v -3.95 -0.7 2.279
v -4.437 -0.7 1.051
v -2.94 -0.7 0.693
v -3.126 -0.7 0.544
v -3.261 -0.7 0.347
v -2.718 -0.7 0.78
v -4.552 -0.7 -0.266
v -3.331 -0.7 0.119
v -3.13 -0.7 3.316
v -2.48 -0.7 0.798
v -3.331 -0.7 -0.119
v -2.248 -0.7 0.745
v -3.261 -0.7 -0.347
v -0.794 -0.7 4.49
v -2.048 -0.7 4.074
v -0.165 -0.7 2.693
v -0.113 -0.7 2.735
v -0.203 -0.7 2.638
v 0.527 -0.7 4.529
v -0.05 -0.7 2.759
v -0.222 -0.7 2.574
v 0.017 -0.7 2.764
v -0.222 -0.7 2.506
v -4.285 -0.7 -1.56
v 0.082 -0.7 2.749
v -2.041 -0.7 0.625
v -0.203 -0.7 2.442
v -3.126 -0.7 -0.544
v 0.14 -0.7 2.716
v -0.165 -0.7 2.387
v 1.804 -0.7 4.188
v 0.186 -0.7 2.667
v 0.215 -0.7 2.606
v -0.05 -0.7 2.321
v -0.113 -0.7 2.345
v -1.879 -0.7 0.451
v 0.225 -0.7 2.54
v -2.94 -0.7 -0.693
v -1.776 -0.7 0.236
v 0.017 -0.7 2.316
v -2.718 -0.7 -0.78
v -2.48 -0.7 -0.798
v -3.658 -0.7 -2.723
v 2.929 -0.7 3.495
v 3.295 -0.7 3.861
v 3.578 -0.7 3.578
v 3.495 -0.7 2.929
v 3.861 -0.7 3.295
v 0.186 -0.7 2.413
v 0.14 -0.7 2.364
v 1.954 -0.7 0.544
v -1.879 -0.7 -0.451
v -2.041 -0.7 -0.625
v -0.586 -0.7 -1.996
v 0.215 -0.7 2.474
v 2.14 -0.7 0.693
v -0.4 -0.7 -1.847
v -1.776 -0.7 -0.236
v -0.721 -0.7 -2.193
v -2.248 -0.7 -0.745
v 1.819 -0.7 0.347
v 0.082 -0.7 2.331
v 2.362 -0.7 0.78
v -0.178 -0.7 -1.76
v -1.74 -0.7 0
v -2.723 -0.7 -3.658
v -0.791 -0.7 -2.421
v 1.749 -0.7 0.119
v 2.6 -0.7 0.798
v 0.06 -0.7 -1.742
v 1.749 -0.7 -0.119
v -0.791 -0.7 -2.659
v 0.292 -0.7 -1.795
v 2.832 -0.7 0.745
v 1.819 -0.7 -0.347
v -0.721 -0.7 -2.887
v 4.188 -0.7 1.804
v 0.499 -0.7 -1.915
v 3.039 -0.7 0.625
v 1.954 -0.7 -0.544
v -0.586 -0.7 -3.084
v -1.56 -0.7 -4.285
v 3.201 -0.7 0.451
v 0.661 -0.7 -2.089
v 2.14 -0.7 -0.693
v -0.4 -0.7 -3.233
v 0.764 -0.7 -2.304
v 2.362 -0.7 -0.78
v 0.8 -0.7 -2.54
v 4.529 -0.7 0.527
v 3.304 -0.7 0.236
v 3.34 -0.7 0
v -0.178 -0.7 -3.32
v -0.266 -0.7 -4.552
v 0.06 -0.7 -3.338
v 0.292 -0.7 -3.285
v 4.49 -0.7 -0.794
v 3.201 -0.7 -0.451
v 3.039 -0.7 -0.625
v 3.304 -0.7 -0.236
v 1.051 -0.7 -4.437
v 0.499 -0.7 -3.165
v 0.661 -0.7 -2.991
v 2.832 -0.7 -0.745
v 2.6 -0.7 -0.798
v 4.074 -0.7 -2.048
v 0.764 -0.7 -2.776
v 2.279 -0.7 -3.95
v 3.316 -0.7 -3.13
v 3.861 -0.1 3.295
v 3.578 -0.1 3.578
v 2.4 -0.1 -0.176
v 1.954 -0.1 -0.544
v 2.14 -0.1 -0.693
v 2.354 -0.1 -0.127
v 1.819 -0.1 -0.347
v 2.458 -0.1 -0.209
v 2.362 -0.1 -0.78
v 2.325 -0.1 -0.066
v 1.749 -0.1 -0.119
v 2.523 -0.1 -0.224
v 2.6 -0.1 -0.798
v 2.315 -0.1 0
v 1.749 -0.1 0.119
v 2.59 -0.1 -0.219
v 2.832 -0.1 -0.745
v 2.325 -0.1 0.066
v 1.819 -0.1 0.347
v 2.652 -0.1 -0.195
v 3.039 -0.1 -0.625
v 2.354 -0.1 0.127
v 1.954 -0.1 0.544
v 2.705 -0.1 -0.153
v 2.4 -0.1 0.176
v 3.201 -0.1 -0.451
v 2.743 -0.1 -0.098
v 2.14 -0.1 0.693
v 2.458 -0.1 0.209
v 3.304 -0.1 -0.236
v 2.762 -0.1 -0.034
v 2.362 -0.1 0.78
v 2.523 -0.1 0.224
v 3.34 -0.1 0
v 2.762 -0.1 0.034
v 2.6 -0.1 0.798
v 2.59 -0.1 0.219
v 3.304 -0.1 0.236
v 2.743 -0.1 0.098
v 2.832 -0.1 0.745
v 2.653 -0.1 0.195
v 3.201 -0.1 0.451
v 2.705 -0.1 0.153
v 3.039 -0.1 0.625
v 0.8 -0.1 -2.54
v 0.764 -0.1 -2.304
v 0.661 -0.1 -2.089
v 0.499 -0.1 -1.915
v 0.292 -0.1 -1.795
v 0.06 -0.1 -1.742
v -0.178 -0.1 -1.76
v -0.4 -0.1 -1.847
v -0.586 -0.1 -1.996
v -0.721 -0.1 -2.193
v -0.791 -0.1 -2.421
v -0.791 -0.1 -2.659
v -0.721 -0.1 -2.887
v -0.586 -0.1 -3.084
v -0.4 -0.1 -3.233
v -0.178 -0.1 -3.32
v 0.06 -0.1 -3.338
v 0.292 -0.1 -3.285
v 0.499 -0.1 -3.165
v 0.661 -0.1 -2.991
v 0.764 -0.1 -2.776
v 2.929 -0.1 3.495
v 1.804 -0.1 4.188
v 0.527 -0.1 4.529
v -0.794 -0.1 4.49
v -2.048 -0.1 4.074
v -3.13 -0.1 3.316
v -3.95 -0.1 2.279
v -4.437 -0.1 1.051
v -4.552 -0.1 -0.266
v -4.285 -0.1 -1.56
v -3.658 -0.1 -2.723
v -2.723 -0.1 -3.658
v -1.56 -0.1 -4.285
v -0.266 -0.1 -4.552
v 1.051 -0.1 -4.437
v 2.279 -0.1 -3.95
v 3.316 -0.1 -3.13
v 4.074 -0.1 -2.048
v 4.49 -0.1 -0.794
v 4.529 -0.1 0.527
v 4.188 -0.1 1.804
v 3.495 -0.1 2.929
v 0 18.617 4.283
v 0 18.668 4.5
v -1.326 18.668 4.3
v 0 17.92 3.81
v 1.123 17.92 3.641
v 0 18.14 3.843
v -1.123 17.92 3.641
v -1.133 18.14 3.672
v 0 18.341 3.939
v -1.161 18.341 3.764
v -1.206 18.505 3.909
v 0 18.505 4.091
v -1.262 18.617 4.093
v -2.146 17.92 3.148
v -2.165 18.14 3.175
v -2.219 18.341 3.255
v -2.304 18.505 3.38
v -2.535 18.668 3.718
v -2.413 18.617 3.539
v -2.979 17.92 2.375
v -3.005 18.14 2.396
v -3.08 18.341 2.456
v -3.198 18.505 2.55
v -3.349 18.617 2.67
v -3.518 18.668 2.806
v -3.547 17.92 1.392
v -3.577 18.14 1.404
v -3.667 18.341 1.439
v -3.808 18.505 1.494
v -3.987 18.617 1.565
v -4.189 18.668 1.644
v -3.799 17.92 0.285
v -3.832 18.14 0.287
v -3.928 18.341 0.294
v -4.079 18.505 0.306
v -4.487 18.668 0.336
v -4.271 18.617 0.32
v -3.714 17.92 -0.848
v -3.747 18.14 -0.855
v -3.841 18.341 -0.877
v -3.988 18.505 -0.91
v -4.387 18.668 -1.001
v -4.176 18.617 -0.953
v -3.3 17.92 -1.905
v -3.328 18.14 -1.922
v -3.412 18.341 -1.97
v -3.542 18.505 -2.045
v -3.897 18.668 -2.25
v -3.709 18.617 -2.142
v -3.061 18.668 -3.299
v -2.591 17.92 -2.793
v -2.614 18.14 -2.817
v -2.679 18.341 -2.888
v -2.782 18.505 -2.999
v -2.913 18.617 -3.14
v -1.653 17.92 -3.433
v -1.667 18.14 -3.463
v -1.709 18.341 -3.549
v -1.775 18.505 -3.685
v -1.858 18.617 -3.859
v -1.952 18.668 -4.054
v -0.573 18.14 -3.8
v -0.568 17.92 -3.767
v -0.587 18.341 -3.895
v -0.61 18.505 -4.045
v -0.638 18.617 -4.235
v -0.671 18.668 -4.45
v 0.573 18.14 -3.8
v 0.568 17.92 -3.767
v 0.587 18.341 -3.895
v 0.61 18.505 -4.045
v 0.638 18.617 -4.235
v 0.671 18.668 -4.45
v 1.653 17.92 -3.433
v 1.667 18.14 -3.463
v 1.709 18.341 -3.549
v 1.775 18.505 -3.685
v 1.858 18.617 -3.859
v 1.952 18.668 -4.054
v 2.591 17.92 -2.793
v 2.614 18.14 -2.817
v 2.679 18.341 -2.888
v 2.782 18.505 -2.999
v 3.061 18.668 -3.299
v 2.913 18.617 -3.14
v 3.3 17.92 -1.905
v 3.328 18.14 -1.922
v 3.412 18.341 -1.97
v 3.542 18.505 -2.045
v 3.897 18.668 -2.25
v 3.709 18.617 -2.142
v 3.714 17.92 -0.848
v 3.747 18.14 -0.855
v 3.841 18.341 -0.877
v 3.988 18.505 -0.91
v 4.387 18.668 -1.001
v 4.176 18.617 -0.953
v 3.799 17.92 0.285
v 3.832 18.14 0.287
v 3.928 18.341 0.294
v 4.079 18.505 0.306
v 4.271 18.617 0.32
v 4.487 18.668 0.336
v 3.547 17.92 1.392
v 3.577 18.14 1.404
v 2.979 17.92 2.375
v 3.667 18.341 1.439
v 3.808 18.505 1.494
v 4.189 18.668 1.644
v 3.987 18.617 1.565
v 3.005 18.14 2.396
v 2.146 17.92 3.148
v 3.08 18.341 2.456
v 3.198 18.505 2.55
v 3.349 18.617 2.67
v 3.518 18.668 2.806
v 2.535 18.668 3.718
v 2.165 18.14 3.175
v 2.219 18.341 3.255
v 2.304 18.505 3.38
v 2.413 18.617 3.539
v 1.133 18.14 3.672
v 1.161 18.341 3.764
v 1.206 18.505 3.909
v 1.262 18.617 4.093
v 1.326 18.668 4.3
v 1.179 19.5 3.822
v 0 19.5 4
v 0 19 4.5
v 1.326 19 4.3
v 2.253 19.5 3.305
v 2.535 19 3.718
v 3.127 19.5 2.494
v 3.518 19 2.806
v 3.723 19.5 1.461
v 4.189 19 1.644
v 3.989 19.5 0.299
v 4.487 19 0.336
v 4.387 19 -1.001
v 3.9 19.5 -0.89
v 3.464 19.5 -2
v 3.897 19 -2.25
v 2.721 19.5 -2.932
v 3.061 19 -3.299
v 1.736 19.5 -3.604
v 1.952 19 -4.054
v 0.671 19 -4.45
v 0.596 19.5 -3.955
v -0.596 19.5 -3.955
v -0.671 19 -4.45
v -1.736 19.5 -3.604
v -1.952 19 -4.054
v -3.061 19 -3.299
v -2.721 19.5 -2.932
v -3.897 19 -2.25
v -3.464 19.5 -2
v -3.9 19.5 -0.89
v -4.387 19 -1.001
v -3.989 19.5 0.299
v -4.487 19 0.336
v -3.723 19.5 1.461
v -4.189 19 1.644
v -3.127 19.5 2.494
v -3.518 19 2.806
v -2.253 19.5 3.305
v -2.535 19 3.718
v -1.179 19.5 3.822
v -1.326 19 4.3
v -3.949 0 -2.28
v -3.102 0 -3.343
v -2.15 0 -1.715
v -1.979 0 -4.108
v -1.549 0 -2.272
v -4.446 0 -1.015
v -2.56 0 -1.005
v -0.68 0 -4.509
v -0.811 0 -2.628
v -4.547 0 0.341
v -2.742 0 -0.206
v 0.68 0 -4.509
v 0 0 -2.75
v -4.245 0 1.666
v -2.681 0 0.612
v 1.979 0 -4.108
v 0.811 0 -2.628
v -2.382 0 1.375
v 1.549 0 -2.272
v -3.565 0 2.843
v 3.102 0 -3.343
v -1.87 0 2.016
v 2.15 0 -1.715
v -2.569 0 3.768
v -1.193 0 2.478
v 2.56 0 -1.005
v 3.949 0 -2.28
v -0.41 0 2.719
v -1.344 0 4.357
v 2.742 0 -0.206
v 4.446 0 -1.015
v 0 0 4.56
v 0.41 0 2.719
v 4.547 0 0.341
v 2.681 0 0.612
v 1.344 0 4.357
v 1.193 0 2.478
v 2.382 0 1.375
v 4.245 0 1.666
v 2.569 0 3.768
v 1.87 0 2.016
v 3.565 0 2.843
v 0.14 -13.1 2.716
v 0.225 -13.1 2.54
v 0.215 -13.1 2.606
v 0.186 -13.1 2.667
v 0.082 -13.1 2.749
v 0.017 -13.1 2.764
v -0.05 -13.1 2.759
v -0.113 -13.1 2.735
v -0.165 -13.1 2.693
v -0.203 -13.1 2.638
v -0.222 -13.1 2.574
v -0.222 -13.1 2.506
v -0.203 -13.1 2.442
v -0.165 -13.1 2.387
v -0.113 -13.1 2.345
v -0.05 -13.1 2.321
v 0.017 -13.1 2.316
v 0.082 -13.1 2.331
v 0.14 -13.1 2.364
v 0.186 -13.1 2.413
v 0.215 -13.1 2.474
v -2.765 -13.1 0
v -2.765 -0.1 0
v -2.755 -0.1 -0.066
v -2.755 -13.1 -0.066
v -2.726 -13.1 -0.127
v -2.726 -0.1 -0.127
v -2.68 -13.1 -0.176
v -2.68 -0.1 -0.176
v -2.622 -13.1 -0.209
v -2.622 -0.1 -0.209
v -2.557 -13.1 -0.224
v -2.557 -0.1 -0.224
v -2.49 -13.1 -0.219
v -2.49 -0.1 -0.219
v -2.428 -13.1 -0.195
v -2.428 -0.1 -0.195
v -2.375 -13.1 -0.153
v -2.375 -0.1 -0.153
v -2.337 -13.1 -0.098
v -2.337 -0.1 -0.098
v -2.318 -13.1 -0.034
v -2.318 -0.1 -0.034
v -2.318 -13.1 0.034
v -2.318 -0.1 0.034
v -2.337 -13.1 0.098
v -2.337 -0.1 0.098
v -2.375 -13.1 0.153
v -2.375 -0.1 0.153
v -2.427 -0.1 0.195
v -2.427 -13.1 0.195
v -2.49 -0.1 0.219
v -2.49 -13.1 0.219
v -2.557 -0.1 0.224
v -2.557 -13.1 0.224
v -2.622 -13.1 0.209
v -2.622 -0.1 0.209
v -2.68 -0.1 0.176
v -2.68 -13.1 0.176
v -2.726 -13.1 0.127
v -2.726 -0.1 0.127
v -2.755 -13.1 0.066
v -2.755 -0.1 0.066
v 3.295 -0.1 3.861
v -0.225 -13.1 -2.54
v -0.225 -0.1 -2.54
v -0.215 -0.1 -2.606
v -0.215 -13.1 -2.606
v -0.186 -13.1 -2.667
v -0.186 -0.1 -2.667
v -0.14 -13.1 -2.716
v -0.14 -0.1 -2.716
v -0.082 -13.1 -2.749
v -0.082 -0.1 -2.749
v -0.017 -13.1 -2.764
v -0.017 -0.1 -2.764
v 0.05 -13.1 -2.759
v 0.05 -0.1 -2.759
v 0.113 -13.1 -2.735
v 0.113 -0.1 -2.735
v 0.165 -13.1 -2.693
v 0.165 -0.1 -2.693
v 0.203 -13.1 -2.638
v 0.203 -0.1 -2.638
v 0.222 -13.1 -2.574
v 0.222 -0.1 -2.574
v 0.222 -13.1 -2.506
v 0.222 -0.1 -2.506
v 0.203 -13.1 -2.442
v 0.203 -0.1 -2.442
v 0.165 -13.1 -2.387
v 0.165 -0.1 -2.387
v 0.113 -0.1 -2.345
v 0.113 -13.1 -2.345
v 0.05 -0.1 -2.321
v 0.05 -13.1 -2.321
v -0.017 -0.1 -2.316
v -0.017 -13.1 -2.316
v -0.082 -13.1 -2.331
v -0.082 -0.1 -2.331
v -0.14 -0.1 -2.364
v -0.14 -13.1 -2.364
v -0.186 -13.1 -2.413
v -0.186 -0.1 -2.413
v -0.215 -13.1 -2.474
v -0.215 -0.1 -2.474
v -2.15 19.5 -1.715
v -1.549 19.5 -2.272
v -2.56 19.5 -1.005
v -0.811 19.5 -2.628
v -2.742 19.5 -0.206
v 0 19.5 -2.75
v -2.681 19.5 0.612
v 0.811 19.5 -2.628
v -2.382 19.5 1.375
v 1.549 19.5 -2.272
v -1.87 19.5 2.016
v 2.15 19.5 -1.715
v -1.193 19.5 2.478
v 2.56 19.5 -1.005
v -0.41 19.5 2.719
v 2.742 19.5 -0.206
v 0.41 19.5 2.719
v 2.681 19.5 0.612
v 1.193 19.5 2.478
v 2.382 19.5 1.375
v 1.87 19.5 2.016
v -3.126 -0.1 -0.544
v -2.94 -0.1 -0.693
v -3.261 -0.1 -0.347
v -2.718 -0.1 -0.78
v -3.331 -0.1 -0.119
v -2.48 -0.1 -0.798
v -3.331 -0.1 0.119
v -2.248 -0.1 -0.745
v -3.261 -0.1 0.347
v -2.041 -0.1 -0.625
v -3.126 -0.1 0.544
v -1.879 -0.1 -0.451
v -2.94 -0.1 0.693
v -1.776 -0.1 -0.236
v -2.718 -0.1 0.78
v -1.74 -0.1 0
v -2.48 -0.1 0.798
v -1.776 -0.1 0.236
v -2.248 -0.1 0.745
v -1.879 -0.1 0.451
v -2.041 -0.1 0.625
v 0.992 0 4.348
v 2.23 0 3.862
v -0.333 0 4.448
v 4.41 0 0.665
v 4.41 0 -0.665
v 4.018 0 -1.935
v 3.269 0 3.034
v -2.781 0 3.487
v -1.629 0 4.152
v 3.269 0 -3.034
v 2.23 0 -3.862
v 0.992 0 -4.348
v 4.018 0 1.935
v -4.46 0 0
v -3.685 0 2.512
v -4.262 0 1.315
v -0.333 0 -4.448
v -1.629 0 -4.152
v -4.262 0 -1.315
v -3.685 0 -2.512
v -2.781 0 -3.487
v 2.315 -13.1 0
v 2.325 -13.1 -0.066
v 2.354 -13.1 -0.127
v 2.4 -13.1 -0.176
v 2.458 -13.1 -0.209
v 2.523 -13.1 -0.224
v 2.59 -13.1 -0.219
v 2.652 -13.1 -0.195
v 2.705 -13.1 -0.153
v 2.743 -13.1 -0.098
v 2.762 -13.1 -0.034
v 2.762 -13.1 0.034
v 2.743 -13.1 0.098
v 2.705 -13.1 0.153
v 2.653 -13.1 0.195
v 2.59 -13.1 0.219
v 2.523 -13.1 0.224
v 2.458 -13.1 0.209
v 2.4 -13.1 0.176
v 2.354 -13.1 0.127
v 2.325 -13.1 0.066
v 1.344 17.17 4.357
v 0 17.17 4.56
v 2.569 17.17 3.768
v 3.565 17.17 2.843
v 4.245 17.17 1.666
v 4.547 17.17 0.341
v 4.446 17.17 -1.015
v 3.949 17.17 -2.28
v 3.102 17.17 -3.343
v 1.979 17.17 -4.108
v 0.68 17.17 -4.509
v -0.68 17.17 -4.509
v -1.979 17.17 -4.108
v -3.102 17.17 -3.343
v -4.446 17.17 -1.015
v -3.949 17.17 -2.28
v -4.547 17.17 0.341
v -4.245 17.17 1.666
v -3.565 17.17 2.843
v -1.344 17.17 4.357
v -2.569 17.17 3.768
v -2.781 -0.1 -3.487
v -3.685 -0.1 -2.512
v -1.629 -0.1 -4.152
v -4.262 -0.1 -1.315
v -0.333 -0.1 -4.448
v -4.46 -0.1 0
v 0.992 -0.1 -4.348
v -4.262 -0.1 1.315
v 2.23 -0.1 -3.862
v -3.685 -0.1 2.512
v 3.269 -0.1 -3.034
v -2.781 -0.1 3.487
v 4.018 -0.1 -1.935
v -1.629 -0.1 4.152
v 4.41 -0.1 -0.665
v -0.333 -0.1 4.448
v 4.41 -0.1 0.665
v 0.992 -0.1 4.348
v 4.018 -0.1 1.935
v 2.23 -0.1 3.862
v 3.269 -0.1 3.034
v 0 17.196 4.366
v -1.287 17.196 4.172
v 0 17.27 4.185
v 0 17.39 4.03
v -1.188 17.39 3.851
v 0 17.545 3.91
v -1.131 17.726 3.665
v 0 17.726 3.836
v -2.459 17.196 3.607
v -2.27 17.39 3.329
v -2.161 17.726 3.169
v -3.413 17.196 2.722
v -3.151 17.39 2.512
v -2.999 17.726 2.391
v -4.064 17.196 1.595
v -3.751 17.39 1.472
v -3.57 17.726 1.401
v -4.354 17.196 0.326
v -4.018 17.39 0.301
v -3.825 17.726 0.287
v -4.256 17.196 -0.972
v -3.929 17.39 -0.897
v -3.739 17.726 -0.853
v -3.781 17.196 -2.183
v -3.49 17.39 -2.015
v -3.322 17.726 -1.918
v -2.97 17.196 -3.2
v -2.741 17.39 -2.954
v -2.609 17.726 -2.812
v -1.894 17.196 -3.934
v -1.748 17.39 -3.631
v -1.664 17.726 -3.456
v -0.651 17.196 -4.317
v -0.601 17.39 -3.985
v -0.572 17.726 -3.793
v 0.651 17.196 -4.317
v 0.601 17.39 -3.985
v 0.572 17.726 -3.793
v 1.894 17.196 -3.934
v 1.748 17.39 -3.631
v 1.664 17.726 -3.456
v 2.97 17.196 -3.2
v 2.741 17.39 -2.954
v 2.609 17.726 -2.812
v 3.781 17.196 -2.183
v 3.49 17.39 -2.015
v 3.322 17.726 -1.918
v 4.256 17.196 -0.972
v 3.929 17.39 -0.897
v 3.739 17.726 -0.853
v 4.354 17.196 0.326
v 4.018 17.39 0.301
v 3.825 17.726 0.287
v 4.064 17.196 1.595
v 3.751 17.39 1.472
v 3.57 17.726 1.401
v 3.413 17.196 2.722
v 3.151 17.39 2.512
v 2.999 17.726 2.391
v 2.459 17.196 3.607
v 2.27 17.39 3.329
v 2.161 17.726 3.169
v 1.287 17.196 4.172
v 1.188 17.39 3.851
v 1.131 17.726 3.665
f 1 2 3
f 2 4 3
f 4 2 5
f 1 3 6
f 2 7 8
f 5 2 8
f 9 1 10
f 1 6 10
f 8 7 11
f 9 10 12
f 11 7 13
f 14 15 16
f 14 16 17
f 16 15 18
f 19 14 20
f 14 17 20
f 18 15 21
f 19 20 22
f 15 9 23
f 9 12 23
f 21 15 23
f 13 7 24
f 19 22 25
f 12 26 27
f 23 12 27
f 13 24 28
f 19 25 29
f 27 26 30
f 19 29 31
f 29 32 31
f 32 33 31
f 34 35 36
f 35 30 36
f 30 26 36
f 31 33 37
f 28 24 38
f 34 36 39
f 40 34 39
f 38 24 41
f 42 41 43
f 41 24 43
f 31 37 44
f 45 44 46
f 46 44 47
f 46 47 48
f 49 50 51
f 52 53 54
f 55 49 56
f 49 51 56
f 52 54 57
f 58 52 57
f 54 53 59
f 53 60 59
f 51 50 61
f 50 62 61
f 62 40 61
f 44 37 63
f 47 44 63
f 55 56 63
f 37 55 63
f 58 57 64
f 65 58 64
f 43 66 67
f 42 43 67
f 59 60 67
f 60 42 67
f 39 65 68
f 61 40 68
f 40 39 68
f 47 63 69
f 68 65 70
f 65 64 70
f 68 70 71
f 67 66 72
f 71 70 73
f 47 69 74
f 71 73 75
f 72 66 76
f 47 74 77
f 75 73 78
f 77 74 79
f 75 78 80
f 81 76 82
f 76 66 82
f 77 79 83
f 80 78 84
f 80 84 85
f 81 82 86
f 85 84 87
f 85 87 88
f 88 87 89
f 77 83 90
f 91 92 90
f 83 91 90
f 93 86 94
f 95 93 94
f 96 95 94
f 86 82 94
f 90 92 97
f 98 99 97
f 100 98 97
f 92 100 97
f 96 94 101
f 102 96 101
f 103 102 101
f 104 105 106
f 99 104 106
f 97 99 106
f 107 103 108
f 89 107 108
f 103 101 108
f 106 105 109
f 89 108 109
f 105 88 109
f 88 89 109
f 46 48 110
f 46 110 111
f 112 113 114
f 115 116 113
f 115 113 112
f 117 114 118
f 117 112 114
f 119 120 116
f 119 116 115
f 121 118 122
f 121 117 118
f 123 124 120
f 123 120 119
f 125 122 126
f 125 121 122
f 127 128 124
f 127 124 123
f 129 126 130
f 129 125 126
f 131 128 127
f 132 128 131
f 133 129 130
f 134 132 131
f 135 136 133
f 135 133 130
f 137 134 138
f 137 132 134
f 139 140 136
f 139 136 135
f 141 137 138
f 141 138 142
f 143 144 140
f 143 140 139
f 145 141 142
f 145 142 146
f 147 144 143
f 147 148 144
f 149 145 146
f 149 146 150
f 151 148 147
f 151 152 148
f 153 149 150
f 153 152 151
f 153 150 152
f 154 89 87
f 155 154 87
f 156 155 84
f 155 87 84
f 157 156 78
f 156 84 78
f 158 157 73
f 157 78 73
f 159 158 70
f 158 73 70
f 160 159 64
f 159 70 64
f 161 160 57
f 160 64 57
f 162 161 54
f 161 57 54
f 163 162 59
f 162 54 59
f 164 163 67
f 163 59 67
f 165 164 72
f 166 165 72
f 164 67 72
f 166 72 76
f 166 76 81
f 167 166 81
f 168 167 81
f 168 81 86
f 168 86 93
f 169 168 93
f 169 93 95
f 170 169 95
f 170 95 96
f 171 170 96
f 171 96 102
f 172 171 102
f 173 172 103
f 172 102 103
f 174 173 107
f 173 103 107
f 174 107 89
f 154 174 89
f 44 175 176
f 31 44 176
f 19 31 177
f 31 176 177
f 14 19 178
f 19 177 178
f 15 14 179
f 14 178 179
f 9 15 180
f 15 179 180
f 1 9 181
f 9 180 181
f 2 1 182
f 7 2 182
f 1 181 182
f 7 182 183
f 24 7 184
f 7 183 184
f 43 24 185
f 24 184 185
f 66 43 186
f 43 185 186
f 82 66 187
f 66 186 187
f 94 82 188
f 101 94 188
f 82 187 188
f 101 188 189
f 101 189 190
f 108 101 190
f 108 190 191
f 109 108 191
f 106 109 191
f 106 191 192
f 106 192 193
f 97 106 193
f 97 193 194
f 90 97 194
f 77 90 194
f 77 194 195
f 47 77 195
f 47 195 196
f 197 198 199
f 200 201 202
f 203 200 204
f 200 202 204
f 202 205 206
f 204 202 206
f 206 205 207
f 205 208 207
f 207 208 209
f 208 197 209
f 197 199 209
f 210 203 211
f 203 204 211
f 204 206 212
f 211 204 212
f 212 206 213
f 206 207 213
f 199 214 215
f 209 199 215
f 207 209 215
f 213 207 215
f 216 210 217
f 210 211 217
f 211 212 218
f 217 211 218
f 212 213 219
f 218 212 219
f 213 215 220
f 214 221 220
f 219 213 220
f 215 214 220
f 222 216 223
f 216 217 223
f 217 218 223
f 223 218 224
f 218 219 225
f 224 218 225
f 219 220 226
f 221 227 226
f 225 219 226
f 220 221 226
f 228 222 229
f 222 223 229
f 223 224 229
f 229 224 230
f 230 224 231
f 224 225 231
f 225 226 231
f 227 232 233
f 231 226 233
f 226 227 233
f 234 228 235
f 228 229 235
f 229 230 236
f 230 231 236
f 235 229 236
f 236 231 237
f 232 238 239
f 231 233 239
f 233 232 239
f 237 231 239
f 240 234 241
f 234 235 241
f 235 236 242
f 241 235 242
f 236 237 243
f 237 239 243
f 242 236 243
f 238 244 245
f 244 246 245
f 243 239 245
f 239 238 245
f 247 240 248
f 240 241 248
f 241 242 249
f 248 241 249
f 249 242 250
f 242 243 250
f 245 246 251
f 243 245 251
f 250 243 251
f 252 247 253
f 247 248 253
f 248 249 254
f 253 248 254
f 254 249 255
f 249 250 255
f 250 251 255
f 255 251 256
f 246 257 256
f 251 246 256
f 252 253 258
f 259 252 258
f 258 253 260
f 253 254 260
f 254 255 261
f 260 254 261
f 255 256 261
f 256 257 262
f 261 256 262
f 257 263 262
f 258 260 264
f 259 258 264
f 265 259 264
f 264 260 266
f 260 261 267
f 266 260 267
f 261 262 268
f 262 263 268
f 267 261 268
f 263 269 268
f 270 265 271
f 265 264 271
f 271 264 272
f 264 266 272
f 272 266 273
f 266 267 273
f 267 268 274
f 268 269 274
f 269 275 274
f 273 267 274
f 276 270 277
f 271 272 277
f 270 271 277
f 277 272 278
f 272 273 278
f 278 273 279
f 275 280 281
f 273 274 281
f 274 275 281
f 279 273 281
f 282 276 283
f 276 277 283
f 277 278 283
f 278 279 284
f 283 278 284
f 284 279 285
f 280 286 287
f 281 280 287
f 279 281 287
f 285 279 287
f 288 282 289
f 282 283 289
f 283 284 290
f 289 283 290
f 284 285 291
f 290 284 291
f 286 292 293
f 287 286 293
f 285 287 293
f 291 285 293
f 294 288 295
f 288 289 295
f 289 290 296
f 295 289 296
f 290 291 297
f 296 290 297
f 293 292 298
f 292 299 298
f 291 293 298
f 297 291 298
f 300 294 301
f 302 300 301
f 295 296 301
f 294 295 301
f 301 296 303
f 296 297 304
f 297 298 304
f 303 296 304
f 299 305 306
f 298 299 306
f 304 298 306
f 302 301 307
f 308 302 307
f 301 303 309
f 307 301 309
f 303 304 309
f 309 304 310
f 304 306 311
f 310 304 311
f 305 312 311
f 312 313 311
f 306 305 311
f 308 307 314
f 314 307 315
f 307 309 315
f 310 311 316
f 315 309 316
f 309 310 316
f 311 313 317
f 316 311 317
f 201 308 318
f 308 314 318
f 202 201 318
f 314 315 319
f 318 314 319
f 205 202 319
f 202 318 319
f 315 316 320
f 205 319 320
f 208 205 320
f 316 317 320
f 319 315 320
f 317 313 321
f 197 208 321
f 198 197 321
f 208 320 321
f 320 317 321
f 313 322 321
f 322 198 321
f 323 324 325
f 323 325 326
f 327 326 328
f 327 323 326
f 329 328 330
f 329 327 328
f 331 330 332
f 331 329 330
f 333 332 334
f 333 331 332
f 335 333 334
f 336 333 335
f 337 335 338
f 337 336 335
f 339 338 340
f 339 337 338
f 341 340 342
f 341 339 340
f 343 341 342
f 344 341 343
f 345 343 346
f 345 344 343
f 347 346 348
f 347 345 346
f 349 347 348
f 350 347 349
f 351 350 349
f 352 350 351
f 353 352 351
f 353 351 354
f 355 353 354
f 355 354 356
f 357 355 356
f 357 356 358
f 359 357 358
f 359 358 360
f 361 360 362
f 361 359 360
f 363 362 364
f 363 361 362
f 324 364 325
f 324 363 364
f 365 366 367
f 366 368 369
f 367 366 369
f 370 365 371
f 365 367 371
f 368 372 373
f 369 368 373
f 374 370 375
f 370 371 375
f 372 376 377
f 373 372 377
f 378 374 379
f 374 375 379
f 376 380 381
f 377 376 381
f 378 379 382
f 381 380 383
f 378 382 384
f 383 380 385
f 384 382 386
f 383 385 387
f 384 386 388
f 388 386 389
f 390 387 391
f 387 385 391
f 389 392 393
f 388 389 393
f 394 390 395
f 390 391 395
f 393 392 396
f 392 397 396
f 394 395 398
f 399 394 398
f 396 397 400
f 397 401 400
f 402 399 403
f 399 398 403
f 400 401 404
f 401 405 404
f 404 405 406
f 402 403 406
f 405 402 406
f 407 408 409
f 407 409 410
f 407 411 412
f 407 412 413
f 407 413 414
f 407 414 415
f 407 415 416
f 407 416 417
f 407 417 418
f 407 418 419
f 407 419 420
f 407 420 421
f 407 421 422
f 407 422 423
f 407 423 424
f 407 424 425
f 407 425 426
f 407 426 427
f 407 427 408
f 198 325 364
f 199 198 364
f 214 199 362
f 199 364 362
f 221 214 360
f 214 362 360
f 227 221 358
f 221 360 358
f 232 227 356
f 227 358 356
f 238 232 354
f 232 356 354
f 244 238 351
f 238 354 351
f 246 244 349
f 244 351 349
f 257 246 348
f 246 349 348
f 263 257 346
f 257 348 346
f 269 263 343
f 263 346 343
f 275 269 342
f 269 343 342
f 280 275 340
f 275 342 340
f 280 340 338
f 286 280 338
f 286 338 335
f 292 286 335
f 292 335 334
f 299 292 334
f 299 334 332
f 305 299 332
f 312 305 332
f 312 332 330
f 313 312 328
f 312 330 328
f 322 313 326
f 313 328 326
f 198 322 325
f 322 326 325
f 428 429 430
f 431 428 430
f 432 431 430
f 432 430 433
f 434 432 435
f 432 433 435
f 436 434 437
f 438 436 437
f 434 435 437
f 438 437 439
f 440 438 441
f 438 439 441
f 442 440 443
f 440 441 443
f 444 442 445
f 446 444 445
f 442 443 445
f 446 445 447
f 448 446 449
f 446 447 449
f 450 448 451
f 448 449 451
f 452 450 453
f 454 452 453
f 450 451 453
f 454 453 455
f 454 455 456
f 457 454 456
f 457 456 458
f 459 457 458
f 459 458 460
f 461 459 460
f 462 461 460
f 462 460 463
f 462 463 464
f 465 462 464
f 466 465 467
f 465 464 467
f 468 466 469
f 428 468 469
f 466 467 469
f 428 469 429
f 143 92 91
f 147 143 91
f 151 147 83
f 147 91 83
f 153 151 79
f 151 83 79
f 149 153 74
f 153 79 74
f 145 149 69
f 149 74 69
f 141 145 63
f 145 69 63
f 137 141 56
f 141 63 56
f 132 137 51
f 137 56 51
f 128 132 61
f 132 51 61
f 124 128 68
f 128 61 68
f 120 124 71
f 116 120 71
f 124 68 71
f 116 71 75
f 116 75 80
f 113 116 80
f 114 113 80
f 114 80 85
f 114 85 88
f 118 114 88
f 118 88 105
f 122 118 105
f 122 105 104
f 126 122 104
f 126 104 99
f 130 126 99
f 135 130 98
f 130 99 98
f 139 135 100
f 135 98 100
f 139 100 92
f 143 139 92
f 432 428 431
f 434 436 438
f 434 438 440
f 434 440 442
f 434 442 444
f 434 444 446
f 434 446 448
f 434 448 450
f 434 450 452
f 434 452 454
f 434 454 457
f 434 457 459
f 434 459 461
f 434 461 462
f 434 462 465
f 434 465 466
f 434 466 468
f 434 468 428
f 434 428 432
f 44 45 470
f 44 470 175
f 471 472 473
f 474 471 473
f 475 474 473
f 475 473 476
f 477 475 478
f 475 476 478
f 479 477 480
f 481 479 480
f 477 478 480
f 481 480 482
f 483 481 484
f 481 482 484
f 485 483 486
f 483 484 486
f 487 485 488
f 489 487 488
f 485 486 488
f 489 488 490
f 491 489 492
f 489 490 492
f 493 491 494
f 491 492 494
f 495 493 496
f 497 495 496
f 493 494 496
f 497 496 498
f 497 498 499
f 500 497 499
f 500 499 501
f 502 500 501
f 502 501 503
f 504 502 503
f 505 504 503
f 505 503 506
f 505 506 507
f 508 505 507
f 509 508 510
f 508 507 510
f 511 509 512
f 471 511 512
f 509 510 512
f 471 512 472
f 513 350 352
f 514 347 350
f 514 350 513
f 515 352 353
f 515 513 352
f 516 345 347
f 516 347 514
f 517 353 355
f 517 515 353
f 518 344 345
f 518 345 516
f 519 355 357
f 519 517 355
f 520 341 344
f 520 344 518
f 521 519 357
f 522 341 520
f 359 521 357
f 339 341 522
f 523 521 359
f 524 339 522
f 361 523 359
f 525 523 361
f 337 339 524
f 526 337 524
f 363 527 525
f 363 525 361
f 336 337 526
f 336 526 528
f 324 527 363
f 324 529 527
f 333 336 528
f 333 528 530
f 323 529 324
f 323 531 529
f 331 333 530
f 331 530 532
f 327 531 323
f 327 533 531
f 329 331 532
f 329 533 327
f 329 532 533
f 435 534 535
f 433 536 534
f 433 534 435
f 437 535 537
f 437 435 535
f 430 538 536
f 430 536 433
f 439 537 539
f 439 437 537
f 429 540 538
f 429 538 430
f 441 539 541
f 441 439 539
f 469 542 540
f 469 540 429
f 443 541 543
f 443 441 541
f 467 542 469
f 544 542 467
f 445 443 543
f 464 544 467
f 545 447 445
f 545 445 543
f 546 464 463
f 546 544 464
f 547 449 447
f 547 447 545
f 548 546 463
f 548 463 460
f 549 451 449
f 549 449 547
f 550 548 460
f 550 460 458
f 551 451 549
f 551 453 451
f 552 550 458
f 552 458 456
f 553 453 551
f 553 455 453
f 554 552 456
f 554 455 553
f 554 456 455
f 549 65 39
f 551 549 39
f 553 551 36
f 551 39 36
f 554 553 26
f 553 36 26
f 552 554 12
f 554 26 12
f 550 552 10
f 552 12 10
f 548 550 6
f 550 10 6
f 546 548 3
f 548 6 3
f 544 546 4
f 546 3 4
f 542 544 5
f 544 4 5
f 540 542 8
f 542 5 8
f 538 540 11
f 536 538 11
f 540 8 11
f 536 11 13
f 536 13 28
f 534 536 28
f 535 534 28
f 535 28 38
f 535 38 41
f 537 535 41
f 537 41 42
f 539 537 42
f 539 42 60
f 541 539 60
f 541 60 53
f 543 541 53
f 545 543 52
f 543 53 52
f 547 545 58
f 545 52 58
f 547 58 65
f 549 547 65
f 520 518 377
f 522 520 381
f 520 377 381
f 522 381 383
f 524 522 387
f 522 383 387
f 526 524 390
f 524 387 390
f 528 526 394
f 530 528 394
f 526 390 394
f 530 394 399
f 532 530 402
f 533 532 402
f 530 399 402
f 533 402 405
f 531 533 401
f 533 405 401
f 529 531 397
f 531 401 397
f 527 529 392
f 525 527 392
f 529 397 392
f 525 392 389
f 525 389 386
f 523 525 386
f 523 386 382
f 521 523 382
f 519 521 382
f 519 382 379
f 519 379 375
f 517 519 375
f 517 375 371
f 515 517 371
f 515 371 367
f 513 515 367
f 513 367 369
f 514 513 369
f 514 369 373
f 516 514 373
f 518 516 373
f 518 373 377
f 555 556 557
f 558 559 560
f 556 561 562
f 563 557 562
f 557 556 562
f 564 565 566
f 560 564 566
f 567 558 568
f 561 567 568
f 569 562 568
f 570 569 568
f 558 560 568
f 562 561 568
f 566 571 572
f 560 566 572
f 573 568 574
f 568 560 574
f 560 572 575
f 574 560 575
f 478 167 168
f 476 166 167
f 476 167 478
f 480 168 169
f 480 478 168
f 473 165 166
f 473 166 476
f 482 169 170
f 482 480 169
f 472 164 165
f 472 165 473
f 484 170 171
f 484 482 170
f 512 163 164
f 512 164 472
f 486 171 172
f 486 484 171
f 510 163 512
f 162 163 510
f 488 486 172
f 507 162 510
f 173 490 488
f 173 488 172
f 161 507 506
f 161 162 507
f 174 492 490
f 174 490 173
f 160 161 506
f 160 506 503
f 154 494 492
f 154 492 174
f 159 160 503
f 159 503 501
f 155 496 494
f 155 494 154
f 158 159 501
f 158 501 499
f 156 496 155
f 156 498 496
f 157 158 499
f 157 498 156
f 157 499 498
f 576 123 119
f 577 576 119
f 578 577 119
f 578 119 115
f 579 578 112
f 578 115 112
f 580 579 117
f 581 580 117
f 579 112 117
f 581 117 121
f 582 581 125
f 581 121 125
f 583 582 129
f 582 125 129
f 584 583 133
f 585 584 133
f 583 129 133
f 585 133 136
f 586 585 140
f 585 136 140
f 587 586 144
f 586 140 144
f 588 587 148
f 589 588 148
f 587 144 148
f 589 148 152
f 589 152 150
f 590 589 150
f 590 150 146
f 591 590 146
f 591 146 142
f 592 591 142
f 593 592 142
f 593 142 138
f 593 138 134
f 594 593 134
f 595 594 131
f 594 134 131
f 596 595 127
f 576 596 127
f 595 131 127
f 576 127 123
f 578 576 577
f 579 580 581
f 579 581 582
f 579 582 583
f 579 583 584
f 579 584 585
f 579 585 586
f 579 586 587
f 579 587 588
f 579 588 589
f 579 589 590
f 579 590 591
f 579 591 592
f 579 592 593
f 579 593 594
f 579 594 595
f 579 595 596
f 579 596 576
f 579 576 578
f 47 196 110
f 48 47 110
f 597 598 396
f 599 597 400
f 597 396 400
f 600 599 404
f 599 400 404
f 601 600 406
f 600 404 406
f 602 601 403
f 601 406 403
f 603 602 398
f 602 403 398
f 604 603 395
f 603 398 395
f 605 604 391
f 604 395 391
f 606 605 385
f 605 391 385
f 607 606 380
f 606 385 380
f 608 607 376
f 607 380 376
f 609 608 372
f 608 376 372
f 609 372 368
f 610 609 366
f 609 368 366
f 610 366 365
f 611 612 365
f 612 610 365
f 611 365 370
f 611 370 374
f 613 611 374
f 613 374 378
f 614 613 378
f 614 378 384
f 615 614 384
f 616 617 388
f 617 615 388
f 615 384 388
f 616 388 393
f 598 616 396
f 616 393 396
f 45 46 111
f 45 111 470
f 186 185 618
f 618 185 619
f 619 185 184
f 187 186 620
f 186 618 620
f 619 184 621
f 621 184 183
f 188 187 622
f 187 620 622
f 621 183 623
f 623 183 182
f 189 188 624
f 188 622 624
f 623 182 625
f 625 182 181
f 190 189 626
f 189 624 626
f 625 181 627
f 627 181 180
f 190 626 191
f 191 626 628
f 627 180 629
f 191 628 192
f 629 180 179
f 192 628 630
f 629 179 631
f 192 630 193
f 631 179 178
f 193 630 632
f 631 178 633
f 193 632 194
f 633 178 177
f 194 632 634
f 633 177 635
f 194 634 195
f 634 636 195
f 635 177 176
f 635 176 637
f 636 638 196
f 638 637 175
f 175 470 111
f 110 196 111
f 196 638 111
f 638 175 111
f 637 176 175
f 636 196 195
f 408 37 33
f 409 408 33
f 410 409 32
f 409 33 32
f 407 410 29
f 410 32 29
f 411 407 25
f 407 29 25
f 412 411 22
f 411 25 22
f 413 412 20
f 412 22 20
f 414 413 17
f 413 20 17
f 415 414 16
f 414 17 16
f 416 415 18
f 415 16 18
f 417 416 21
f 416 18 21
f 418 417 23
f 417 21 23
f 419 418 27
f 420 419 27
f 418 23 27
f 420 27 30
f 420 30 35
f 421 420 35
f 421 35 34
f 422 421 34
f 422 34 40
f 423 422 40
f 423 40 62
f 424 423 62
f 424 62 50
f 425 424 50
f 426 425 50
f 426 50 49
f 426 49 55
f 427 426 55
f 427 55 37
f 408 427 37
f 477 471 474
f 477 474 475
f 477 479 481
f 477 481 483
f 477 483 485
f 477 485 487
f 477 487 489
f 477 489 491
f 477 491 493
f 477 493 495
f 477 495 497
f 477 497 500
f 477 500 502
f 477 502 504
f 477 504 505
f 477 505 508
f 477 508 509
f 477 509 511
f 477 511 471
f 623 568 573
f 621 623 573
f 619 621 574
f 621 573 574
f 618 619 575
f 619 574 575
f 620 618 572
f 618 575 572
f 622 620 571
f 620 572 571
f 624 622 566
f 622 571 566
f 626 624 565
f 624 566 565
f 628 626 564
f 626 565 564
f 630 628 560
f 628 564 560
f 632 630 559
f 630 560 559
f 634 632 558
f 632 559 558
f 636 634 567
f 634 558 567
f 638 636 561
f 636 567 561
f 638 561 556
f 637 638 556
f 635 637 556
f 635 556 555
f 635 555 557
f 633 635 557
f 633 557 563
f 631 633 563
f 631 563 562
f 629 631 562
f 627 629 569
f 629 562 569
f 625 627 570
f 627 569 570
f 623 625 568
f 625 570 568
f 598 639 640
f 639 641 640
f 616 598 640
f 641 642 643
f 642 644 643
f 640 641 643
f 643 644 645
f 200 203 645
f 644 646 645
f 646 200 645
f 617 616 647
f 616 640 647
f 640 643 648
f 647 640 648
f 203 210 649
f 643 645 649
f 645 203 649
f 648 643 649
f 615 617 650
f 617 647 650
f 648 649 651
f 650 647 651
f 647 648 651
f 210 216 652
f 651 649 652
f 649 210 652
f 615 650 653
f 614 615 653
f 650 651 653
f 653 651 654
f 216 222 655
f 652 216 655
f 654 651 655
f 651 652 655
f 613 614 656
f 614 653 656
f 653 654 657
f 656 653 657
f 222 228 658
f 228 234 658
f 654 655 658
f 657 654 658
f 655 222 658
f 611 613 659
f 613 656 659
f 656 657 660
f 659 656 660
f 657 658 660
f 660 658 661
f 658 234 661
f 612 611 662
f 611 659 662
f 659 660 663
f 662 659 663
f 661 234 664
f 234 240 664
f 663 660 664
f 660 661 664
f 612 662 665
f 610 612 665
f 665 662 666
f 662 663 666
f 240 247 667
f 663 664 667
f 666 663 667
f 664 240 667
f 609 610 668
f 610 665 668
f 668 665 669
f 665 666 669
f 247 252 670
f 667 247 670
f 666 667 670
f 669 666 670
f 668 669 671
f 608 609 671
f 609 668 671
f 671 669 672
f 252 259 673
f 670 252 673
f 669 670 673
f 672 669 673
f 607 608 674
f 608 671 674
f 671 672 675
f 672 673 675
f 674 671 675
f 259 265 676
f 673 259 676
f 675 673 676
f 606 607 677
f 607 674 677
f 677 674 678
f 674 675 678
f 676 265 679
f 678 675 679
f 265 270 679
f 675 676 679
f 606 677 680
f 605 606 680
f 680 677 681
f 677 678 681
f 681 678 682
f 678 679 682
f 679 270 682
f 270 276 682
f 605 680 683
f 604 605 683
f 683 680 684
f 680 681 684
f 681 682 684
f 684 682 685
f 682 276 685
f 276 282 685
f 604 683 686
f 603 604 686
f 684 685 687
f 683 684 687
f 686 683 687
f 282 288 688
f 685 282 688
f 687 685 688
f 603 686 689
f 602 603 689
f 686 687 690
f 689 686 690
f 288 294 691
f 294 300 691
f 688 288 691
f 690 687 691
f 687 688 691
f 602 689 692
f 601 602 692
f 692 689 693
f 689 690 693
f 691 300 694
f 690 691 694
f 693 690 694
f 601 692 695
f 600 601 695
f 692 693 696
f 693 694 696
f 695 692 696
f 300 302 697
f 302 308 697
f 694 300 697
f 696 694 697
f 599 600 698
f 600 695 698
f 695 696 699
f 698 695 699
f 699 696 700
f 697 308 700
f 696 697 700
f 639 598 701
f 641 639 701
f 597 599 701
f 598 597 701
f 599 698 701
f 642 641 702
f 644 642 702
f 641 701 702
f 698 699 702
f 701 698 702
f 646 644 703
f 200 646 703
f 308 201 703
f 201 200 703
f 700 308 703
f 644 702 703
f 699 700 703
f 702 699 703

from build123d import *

# Parameters (mm, degrees)
SCHIZZO1_R                   = 4.56
ESTRUSIONE_ESTRUSIONE1_DEPTH = 19.5
SCHIZZO2_R                   = 0.75
SCHIZZO3_W                   = 2.392896604
SCHIZZO3_H                   = 1.50856525
SMUSSO1_SIZE                 = 0.5
FORO_PER_VITE_M5_1_D         = 5.5
ESTRUSIONE_ESTRUSIONE2_DEPTH = 0.6
SCHIZZO9_R                   = 0.8
TAGLIO_ESTRUSIONE1_DEPTH     = 0.6
SCHIZZO10_R                  = 0.225
ESTRUSIONE_ESTRUSIONE3_DEPTH = 13


with BuildPart() as part:
    # Schizzo1 → Estrusione-Estrusione1 (new body)
    with BuildSketch(Plane(origin=(0, 0, 0), x_dir=(1, 0, 0), z_dir=(0, 1, 0))):
        with Locations(Location((0, 0, 0), (0, 0, 270))):
            Circle(SCHIZZO1_R)
    extrude(amount=ESTRUSIONE_ESTRUSIONE1_DEPTH)

    # Schizzo2 → Taglia-Rivoluzione1 (revolve, cut)
    with BuildSketch(Plane.XY, mode=Mode.PRIVATE) as taglia_rivoluzione1_sk:
        with Locations((-4.56, 17.92)):
            Circle(SCHIZZO2_R)
    revolve(taglia_rivoluzione1_sk.sketch.rotate(Axis((0, 19.5, 0), (0, -1, 0)), 270), axis=Axis((0, 19.5, 0), (0, -1, 0)), mode=Mode.SUBTRACT)

    # Schizzo3 → Taglia-Rivoluzione2 (revolve, cut)
    with BuildSketch(Plane.XY, mode=Mode.PRIVATE) as taglia_rivoluzione2_sk:
        with Locations((-5.696448302, 18.983195512)):
            Rectangle(SCHIZZO3_W, SCHIZZO3_H)
    revolve(taglia_rivoluzione2_sk.sketch.rotate(Axis((0, 19.5, 0), (0, -1, 0)), 270), axis=Axis((0, 19.5, 0), (0, -1, 0)), mode=Mode.SUBTRACT)

    # Smusso1
    smusso1_edges = [part.edges().sort_by_distance(p)[0] for p in [
        (0, 19.5, -4.5),
    ]]
    chamfer(smusso1_edges, length=SMUSSO1_SIZE)

    # Foro per Vite M5-1 (through all)
    with Locations(Plane.ZX.offset(19.5)):
        with Locations((0, 0)):
            Hole(FORO_PER_VITE_M5_1_D / 2)


with BuildPart() as body_2:
    # Schizzo7 → Rivoluzione1 (revolve)
    with BuildSketch(Plane.XY):
        Polygon((0, 0), (0, -0.7), (-4.56, -0.7), (-4.56, -0.1), (-4.46, -0.1), (-4.46, 0), align=None)
    revolve(axis=Axis((0, 0, 0), (0, -1, 0)))

    # Schizzo8 → Estrusione-Estrusione2 (add)
    with BuildSketch(Plane.XZ.offset(0.7)):
        Polygon((0.282842712, -0.282842712), (3.860803025, 3.2951176), (3.577960313, 3.577960313), (3.2951176, 3.860803025), (-0.282842712, 0.282842712), align=None)
    extrude(amount=-ESTRUSIONE_ESTRUSIONE2_DEPTH)

    # Schizzo9 → Taglio-Estrusione1 (cut)
    with BuildSketch(Plane.XZ.offset(0.7)):
        with Locations((2.54, 0)):
            Circle(SCHIZZO9_R)
        with Locations((0, -2.54)):
            Circle(SCHIZZO9_R)
        with Locations((-2.54, 0)):
            Circle(SCHIZZO9_R)
    extrude(amount=-TAGLIO_ESTRUSIONE1_DEPTH, mode=Mode.SUBTRACT)

    # Schizzo10 → Estrusione-Estrusione3 (add)
    with BuildSketch(Plane.XZ.offset(0.1)):
        with Locations((0, 2.54)):
            Circle(SCHIZZO10_R)
        with Locations(Location((2.54, 0, 0), (0, 0, 180))):
            Circle(SCHIZZO10_R)
        with Locations(Location((0, -2.54, 0), (0, 0, 180))):
            Circle(SCHIZZO10_R)
        with Locations(Location((-2.54, 0, 0), (0, 0, 180))):
            Circle(SCHIZZO10_R)
    extrude(amount=ESTRUSIONE_ESTRUSIONE3_DEPTH)


solid = Compound([part.part, body_2.part])
